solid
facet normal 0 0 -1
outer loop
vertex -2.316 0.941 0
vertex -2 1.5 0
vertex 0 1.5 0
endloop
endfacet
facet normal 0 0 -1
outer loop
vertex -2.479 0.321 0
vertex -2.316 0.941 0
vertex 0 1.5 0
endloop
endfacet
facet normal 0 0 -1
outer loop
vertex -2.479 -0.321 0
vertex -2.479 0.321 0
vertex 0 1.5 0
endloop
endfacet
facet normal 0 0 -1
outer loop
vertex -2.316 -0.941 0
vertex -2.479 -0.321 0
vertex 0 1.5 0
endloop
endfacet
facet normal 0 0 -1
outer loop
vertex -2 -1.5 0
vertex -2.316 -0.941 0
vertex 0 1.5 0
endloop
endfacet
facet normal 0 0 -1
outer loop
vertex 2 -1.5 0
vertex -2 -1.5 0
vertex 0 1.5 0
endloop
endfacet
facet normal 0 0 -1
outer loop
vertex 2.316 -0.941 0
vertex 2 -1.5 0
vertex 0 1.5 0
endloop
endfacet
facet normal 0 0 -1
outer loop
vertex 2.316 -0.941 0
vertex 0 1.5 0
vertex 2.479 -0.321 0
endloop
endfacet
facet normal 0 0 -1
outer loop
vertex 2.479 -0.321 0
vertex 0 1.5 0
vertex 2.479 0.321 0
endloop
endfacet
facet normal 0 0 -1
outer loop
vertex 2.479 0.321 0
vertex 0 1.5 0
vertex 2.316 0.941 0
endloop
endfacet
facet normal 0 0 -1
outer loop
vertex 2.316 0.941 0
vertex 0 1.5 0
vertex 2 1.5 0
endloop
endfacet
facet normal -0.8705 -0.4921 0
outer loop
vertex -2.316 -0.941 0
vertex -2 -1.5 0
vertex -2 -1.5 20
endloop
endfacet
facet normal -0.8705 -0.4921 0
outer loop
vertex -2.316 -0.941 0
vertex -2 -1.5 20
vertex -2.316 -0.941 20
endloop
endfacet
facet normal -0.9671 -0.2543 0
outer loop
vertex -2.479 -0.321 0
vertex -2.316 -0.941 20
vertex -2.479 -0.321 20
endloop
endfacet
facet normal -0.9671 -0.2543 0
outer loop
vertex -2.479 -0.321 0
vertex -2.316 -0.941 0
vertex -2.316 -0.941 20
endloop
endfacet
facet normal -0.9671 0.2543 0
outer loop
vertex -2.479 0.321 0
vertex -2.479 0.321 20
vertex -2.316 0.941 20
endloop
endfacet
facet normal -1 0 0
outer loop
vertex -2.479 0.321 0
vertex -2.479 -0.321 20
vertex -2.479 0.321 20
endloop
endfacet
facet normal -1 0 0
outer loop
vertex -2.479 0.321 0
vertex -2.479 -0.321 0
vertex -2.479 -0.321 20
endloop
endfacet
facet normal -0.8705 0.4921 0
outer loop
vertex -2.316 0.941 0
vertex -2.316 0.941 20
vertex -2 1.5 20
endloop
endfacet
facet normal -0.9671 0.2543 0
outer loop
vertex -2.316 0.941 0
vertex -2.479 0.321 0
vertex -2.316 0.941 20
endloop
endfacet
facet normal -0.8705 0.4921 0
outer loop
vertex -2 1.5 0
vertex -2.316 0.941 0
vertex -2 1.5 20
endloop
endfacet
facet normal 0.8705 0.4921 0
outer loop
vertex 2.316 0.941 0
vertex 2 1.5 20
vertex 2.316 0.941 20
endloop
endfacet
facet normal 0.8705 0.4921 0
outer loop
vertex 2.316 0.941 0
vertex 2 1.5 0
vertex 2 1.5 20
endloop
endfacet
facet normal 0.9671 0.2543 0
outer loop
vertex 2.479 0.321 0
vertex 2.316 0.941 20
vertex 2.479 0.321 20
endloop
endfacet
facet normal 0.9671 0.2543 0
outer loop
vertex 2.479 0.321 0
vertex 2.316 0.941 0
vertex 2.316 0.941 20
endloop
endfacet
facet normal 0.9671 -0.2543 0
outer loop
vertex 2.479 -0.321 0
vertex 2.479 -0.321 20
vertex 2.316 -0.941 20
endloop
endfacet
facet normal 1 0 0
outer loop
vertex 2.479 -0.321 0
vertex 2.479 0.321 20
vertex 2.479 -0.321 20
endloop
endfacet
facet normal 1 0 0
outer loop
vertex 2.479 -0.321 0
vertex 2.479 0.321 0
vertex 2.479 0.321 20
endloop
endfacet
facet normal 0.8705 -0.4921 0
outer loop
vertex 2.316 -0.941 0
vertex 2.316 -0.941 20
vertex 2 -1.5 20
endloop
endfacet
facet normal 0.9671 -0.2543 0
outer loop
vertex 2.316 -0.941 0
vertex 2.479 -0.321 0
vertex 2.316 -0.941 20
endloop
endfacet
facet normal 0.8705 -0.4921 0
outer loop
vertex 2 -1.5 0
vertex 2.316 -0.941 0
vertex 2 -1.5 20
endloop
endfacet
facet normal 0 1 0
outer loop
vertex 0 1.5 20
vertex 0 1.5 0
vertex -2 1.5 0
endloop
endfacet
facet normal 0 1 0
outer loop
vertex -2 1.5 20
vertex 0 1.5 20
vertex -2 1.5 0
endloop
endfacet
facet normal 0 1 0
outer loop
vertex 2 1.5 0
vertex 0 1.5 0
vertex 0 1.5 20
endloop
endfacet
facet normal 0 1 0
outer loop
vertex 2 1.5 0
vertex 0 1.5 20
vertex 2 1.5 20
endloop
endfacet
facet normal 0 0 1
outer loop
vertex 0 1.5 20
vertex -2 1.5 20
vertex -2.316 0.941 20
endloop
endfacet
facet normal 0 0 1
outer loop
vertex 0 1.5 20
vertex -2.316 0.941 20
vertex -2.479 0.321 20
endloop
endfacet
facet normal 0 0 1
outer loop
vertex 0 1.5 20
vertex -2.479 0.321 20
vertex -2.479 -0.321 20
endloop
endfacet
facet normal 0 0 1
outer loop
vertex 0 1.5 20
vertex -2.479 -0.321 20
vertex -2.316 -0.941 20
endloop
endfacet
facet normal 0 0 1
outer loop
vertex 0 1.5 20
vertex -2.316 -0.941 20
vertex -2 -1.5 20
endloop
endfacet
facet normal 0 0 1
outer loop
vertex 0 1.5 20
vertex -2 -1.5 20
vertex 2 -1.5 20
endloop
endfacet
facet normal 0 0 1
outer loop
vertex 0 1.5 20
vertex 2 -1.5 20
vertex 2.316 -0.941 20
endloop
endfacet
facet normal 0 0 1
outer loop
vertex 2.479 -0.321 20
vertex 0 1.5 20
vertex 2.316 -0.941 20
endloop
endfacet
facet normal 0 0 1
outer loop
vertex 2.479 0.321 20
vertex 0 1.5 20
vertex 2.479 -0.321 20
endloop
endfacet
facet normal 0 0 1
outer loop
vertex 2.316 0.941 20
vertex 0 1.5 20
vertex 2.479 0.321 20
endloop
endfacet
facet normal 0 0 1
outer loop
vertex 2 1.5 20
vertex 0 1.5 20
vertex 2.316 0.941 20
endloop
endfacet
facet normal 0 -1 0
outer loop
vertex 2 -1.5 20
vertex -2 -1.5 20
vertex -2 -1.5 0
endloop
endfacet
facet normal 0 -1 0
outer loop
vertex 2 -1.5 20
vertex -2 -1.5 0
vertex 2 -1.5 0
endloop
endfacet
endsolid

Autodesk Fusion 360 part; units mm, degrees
sketch "Sketch1" plane through (0, 0, 0) normal (0, 0, 1) x (1, 0, 0)
  line L0 (0, 1.5) -> (-2, 1.5)
  line L1 (0, 1.5) -> (2, 1.5)
  arc A0 (-2, 1.5) -> (-2, -1.5) centre (0, 0) ccw
  arc A1 (2, -1.5) -> (2, 1.5) centre (0, 0) ccw
  circle A2 centre (0, 0) radius 3.5
  line L2 (-2, -1.5) -> (2, -1.5)
  dimension "d2" = 5
  dimension "d3" = 1.5
  dimension "d5" = 7
extrude "Extrude1" add sketch "Sketch1" along normal blind 20 contours L0 L1 A0 A1 L2
sketch "Sketch2" plane through (0, 0, 0) normal (0, 0, 1) x (1, 0, 0)
